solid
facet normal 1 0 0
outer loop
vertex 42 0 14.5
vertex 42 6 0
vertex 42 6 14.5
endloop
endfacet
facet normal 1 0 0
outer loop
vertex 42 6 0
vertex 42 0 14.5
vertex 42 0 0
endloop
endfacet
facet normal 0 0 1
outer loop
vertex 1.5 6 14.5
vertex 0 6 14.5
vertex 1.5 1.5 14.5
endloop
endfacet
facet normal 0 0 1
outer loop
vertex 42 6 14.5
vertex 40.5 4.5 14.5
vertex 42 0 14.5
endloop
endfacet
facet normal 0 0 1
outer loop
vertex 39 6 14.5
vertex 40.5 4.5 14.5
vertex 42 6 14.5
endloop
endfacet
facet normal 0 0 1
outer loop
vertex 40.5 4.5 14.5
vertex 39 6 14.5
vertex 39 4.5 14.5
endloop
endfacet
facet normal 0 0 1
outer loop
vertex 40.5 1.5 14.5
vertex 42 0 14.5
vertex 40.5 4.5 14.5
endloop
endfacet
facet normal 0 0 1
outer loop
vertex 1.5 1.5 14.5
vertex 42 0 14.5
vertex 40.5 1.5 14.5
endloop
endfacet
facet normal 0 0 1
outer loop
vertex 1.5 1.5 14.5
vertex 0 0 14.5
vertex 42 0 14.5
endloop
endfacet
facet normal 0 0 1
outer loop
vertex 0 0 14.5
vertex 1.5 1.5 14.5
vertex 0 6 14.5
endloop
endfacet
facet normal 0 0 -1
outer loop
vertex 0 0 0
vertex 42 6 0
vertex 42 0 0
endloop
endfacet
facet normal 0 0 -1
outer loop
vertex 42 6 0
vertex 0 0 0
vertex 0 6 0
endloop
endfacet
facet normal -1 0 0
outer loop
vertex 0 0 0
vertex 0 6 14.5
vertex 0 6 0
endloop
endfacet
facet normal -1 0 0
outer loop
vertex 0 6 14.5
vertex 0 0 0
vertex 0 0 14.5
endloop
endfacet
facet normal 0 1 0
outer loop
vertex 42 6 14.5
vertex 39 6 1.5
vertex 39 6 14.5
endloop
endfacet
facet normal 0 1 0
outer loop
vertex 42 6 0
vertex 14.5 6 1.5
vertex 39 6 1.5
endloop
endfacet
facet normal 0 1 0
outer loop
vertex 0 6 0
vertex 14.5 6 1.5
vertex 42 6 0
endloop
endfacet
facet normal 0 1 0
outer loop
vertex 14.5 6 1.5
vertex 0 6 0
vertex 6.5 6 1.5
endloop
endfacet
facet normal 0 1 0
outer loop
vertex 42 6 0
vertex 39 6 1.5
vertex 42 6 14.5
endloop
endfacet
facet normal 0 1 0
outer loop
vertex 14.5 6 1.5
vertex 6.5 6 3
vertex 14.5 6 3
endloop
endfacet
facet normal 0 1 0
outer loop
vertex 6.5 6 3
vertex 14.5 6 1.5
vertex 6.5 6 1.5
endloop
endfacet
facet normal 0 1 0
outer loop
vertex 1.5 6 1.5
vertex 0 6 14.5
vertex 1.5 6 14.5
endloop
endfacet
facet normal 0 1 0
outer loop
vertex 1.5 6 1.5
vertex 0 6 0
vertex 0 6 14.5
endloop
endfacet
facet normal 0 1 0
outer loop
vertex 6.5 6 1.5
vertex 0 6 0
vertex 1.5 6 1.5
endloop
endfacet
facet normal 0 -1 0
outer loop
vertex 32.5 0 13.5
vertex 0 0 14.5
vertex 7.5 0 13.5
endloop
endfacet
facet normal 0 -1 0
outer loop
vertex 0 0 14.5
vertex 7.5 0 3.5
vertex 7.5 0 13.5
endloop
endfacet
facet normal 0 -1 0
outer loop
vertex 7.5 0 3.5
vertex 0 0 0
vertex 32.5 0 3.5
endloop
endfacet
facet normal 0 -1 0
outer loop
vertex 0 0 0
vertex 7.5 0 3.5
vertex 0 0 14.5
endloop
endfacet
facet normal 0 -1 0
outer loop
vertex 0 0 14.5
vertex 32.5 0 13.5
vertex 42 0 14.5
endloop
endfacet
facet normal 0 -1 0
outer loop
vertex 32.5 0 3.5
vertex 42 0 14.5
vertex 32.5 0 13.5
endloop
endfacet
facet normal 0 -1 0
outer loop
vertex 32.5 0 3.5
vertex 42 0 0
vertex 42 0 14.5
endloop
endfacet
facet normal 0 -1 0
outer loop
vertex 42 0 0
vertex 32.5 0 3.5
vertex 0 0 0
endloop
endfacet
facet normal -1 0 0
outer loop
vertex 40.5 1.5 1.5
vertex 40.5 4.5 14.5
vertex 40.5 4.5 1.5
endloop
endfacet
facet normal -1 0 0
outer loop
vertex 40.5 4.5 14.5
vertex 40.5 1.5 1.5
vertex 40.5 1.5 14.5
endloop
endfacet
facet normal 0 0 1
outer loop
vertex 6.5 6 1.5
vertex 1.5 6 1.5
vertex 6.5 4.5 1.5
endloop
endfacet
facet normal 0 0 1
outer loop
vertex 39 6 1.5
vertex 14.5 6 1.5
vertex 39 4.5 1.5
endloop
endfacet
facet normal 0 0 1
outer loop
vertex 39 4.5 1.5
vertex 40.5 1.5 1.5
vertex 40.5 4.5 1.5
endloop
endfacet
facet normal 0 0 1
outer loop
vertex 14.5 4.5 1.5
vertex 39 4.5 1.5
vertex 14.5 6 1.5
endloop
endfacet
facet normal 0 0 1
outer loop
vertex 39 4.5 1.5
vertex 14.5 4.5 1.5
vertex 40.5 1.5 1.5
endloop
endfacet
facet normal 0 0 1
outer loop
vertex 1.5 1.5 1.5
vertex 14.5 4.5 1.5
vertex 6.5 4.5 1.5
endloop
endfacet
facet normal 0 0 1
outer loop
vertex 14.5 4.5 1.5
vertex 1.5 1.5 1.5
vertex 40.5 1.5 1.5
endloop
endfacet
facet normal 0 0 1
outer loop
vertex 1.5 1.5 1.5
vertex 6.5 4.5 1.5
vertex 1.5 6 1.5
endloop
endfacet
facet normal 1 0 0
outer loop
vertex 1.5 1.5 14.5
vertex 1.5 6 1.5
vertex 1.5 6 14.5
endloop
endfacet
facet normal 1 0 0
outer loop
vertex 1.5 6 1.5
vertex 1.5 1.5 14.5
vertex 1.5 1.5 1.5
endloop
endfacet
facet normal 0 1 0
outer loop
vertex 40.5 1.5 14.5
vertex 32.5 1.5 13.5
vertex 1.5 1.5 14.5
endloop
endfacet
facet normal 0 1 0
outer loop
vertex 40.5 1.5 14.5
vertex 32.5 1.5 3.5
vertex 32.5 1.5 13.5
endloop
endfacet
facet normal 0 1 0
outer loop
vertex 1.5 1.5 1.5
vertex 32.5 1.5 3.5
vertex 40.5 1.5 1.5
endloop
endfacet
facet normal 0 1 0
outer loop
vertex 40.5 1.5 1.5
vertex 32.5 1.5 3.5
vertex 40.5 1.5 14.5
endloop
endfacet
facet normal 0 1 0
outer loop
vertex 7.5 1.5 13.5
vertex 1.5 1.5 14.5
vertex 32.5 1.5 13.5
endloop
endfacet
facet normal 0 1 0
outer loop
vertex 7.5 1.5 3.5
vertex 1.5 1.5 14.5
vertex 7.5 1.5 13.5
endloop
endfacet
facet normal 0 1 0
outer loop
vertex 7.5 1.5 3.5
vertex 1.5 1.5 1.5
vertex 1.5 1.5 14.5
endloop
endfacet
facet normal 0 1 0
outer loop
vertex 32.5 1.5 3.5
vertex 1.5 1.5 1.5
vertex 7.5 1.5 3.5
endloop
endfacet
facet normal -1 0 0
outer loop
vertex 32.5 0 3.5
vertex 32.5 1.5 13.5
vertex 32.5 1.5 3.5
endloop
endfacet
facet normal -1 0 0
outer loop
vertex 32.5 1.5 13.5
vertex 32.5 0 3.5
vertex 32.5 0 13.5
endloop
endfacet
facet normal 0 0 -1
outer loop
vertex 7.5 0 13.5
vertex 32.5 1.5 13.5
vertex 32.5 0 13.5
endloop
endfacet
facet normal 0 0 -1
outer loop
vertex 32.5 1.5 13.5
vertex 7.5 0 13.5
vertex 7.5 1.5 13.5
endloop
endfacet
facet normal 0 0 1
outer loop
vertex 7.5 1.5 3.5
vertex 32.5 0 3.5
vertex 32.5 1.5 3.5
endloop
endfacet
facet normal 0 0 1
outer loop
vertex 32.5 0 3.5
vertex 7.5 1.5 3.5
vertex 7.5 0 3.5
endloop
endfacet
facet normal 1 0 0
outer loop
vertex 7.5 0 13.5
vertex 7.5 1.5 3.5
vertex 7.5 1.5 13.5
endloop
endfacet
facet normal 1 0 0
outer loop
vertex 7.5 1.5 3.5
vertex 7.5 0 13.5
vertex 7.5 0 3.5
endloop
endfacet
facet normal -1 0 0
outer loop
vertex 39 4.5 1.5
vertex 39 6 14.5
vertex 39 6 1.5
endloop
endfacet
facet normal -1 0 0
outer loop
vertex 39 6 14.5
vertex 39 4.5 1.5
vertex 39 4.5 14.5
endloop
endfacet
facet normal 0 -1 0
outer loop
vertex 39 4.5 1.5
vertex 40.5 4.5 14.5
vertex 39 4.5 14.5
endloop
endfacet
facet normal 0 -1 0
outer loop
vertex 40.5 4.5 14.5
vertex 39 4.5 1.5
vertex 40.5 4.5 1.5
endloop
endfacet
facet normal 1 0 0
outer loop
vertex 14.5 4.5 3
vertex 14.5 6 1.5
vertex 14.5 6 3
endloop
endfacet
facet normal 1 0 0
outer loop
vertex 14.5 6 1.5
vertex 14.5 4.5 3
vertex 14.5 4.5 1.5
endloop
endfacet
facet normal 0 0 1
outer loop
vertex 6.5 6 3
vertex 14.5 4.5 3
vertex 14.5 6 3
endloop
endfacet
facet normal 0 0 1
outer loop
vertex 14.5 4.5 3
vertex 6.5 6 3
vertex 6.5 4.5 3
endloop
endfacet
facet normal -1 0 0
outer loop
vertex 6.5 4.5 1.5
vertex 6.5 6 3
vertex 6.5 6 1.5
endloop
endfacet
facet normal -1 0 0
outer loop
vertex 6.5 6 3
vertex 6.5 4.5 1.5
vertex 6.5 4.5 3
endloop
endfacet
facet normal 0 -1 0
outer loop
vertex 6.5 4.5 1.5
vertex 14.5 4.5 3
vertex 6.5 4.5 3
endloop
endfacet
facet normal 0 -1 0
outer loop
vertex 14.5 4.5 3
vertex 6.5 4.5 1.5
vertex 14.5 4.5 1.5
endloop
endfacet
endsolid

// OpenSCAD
$fa = 1;
$fs = 0.5;
$fn = 50;

////////////////////////////////
// All measurements are in mm //
////////////////////////////////

tw = 1.5; // thickness of any walls

// Disk drive hole (DHOLE)
dhole_width = 87;
dhole_height = 213;
dhole_pad_top = 1.5;
dhole_pad_bottom = 1.5;
dhole_pad_right = 10;
dhole_pad_left = 10;

dhole_total_width = dhole_width + dhole_pad_right + dhole_pad_left;
dhole_total_height = dhole_height + dhole_pad_top + dhole_pad_bottom;
dhole_center_x_offset = dhole_total_width/2;

// Metal angled Base (ABASE)
abase_width = 97;
abase_height = 100; // back -- to support
abase_depth = 20; // down -- to support
abase_x_offset_to_dhole = 27;

abase_total_width = abase_width + tw + tw;
abase_total_x_offset_to_dhole = 27 + tw;

// Bottom screw hole
bscrew_radius = 2.5;
bscrew_back_from_dhole = 25.5;
bscrew_x_offset_from_abase_left_edge = abase_total_width - 30;

// Top screw hole
tscrew_radius = 2.5;
tscrew_x_offset_from_left_dhole = 30;
tscrew_back_from_dhole =  21;

///////////////////////////////
// Disk drive hole faceplate //
///////////////////////////////
//translate([-dhole_center_x_offset, 0, 0]) cube([dhole_total_width, tw, //dhole_total_height]);

oled_screen_width = 25;
oled_screen_left_offset = 6;
oled_screen_height = 10;
oled_screen_top_offset = 1;

oled_width = 39;
oled_height = 13;
oled_holder_width = oled_width + tw + tw;
oled_holder_height = oled_height + tw;
oled_holder_depth = 6;

union() {
  difference() {
    cube([oled_holder_width, oled_holder_depth, oled_holder_height]);
      translate([tw, tw, tw])
        cube([oled_width, oled_holder_depth, oled_height +1]);
      translate([tw + oled_screen_left_offset, -1, oled_holder_height - oled_screen_height - oled_screen_top_offset])
        cube([oled_screen_width, 30, oled_screen_height]);
  }
  translate([oled_holder_width - 2*tw, oled_holder_depth - tw, 0])
    cube([2*tw, tw, oled_holder_height]);
  translate([5 + tw, oled_holder_depth - tw, 0])
    cube([8 ,tw, 2*tw]);
}
